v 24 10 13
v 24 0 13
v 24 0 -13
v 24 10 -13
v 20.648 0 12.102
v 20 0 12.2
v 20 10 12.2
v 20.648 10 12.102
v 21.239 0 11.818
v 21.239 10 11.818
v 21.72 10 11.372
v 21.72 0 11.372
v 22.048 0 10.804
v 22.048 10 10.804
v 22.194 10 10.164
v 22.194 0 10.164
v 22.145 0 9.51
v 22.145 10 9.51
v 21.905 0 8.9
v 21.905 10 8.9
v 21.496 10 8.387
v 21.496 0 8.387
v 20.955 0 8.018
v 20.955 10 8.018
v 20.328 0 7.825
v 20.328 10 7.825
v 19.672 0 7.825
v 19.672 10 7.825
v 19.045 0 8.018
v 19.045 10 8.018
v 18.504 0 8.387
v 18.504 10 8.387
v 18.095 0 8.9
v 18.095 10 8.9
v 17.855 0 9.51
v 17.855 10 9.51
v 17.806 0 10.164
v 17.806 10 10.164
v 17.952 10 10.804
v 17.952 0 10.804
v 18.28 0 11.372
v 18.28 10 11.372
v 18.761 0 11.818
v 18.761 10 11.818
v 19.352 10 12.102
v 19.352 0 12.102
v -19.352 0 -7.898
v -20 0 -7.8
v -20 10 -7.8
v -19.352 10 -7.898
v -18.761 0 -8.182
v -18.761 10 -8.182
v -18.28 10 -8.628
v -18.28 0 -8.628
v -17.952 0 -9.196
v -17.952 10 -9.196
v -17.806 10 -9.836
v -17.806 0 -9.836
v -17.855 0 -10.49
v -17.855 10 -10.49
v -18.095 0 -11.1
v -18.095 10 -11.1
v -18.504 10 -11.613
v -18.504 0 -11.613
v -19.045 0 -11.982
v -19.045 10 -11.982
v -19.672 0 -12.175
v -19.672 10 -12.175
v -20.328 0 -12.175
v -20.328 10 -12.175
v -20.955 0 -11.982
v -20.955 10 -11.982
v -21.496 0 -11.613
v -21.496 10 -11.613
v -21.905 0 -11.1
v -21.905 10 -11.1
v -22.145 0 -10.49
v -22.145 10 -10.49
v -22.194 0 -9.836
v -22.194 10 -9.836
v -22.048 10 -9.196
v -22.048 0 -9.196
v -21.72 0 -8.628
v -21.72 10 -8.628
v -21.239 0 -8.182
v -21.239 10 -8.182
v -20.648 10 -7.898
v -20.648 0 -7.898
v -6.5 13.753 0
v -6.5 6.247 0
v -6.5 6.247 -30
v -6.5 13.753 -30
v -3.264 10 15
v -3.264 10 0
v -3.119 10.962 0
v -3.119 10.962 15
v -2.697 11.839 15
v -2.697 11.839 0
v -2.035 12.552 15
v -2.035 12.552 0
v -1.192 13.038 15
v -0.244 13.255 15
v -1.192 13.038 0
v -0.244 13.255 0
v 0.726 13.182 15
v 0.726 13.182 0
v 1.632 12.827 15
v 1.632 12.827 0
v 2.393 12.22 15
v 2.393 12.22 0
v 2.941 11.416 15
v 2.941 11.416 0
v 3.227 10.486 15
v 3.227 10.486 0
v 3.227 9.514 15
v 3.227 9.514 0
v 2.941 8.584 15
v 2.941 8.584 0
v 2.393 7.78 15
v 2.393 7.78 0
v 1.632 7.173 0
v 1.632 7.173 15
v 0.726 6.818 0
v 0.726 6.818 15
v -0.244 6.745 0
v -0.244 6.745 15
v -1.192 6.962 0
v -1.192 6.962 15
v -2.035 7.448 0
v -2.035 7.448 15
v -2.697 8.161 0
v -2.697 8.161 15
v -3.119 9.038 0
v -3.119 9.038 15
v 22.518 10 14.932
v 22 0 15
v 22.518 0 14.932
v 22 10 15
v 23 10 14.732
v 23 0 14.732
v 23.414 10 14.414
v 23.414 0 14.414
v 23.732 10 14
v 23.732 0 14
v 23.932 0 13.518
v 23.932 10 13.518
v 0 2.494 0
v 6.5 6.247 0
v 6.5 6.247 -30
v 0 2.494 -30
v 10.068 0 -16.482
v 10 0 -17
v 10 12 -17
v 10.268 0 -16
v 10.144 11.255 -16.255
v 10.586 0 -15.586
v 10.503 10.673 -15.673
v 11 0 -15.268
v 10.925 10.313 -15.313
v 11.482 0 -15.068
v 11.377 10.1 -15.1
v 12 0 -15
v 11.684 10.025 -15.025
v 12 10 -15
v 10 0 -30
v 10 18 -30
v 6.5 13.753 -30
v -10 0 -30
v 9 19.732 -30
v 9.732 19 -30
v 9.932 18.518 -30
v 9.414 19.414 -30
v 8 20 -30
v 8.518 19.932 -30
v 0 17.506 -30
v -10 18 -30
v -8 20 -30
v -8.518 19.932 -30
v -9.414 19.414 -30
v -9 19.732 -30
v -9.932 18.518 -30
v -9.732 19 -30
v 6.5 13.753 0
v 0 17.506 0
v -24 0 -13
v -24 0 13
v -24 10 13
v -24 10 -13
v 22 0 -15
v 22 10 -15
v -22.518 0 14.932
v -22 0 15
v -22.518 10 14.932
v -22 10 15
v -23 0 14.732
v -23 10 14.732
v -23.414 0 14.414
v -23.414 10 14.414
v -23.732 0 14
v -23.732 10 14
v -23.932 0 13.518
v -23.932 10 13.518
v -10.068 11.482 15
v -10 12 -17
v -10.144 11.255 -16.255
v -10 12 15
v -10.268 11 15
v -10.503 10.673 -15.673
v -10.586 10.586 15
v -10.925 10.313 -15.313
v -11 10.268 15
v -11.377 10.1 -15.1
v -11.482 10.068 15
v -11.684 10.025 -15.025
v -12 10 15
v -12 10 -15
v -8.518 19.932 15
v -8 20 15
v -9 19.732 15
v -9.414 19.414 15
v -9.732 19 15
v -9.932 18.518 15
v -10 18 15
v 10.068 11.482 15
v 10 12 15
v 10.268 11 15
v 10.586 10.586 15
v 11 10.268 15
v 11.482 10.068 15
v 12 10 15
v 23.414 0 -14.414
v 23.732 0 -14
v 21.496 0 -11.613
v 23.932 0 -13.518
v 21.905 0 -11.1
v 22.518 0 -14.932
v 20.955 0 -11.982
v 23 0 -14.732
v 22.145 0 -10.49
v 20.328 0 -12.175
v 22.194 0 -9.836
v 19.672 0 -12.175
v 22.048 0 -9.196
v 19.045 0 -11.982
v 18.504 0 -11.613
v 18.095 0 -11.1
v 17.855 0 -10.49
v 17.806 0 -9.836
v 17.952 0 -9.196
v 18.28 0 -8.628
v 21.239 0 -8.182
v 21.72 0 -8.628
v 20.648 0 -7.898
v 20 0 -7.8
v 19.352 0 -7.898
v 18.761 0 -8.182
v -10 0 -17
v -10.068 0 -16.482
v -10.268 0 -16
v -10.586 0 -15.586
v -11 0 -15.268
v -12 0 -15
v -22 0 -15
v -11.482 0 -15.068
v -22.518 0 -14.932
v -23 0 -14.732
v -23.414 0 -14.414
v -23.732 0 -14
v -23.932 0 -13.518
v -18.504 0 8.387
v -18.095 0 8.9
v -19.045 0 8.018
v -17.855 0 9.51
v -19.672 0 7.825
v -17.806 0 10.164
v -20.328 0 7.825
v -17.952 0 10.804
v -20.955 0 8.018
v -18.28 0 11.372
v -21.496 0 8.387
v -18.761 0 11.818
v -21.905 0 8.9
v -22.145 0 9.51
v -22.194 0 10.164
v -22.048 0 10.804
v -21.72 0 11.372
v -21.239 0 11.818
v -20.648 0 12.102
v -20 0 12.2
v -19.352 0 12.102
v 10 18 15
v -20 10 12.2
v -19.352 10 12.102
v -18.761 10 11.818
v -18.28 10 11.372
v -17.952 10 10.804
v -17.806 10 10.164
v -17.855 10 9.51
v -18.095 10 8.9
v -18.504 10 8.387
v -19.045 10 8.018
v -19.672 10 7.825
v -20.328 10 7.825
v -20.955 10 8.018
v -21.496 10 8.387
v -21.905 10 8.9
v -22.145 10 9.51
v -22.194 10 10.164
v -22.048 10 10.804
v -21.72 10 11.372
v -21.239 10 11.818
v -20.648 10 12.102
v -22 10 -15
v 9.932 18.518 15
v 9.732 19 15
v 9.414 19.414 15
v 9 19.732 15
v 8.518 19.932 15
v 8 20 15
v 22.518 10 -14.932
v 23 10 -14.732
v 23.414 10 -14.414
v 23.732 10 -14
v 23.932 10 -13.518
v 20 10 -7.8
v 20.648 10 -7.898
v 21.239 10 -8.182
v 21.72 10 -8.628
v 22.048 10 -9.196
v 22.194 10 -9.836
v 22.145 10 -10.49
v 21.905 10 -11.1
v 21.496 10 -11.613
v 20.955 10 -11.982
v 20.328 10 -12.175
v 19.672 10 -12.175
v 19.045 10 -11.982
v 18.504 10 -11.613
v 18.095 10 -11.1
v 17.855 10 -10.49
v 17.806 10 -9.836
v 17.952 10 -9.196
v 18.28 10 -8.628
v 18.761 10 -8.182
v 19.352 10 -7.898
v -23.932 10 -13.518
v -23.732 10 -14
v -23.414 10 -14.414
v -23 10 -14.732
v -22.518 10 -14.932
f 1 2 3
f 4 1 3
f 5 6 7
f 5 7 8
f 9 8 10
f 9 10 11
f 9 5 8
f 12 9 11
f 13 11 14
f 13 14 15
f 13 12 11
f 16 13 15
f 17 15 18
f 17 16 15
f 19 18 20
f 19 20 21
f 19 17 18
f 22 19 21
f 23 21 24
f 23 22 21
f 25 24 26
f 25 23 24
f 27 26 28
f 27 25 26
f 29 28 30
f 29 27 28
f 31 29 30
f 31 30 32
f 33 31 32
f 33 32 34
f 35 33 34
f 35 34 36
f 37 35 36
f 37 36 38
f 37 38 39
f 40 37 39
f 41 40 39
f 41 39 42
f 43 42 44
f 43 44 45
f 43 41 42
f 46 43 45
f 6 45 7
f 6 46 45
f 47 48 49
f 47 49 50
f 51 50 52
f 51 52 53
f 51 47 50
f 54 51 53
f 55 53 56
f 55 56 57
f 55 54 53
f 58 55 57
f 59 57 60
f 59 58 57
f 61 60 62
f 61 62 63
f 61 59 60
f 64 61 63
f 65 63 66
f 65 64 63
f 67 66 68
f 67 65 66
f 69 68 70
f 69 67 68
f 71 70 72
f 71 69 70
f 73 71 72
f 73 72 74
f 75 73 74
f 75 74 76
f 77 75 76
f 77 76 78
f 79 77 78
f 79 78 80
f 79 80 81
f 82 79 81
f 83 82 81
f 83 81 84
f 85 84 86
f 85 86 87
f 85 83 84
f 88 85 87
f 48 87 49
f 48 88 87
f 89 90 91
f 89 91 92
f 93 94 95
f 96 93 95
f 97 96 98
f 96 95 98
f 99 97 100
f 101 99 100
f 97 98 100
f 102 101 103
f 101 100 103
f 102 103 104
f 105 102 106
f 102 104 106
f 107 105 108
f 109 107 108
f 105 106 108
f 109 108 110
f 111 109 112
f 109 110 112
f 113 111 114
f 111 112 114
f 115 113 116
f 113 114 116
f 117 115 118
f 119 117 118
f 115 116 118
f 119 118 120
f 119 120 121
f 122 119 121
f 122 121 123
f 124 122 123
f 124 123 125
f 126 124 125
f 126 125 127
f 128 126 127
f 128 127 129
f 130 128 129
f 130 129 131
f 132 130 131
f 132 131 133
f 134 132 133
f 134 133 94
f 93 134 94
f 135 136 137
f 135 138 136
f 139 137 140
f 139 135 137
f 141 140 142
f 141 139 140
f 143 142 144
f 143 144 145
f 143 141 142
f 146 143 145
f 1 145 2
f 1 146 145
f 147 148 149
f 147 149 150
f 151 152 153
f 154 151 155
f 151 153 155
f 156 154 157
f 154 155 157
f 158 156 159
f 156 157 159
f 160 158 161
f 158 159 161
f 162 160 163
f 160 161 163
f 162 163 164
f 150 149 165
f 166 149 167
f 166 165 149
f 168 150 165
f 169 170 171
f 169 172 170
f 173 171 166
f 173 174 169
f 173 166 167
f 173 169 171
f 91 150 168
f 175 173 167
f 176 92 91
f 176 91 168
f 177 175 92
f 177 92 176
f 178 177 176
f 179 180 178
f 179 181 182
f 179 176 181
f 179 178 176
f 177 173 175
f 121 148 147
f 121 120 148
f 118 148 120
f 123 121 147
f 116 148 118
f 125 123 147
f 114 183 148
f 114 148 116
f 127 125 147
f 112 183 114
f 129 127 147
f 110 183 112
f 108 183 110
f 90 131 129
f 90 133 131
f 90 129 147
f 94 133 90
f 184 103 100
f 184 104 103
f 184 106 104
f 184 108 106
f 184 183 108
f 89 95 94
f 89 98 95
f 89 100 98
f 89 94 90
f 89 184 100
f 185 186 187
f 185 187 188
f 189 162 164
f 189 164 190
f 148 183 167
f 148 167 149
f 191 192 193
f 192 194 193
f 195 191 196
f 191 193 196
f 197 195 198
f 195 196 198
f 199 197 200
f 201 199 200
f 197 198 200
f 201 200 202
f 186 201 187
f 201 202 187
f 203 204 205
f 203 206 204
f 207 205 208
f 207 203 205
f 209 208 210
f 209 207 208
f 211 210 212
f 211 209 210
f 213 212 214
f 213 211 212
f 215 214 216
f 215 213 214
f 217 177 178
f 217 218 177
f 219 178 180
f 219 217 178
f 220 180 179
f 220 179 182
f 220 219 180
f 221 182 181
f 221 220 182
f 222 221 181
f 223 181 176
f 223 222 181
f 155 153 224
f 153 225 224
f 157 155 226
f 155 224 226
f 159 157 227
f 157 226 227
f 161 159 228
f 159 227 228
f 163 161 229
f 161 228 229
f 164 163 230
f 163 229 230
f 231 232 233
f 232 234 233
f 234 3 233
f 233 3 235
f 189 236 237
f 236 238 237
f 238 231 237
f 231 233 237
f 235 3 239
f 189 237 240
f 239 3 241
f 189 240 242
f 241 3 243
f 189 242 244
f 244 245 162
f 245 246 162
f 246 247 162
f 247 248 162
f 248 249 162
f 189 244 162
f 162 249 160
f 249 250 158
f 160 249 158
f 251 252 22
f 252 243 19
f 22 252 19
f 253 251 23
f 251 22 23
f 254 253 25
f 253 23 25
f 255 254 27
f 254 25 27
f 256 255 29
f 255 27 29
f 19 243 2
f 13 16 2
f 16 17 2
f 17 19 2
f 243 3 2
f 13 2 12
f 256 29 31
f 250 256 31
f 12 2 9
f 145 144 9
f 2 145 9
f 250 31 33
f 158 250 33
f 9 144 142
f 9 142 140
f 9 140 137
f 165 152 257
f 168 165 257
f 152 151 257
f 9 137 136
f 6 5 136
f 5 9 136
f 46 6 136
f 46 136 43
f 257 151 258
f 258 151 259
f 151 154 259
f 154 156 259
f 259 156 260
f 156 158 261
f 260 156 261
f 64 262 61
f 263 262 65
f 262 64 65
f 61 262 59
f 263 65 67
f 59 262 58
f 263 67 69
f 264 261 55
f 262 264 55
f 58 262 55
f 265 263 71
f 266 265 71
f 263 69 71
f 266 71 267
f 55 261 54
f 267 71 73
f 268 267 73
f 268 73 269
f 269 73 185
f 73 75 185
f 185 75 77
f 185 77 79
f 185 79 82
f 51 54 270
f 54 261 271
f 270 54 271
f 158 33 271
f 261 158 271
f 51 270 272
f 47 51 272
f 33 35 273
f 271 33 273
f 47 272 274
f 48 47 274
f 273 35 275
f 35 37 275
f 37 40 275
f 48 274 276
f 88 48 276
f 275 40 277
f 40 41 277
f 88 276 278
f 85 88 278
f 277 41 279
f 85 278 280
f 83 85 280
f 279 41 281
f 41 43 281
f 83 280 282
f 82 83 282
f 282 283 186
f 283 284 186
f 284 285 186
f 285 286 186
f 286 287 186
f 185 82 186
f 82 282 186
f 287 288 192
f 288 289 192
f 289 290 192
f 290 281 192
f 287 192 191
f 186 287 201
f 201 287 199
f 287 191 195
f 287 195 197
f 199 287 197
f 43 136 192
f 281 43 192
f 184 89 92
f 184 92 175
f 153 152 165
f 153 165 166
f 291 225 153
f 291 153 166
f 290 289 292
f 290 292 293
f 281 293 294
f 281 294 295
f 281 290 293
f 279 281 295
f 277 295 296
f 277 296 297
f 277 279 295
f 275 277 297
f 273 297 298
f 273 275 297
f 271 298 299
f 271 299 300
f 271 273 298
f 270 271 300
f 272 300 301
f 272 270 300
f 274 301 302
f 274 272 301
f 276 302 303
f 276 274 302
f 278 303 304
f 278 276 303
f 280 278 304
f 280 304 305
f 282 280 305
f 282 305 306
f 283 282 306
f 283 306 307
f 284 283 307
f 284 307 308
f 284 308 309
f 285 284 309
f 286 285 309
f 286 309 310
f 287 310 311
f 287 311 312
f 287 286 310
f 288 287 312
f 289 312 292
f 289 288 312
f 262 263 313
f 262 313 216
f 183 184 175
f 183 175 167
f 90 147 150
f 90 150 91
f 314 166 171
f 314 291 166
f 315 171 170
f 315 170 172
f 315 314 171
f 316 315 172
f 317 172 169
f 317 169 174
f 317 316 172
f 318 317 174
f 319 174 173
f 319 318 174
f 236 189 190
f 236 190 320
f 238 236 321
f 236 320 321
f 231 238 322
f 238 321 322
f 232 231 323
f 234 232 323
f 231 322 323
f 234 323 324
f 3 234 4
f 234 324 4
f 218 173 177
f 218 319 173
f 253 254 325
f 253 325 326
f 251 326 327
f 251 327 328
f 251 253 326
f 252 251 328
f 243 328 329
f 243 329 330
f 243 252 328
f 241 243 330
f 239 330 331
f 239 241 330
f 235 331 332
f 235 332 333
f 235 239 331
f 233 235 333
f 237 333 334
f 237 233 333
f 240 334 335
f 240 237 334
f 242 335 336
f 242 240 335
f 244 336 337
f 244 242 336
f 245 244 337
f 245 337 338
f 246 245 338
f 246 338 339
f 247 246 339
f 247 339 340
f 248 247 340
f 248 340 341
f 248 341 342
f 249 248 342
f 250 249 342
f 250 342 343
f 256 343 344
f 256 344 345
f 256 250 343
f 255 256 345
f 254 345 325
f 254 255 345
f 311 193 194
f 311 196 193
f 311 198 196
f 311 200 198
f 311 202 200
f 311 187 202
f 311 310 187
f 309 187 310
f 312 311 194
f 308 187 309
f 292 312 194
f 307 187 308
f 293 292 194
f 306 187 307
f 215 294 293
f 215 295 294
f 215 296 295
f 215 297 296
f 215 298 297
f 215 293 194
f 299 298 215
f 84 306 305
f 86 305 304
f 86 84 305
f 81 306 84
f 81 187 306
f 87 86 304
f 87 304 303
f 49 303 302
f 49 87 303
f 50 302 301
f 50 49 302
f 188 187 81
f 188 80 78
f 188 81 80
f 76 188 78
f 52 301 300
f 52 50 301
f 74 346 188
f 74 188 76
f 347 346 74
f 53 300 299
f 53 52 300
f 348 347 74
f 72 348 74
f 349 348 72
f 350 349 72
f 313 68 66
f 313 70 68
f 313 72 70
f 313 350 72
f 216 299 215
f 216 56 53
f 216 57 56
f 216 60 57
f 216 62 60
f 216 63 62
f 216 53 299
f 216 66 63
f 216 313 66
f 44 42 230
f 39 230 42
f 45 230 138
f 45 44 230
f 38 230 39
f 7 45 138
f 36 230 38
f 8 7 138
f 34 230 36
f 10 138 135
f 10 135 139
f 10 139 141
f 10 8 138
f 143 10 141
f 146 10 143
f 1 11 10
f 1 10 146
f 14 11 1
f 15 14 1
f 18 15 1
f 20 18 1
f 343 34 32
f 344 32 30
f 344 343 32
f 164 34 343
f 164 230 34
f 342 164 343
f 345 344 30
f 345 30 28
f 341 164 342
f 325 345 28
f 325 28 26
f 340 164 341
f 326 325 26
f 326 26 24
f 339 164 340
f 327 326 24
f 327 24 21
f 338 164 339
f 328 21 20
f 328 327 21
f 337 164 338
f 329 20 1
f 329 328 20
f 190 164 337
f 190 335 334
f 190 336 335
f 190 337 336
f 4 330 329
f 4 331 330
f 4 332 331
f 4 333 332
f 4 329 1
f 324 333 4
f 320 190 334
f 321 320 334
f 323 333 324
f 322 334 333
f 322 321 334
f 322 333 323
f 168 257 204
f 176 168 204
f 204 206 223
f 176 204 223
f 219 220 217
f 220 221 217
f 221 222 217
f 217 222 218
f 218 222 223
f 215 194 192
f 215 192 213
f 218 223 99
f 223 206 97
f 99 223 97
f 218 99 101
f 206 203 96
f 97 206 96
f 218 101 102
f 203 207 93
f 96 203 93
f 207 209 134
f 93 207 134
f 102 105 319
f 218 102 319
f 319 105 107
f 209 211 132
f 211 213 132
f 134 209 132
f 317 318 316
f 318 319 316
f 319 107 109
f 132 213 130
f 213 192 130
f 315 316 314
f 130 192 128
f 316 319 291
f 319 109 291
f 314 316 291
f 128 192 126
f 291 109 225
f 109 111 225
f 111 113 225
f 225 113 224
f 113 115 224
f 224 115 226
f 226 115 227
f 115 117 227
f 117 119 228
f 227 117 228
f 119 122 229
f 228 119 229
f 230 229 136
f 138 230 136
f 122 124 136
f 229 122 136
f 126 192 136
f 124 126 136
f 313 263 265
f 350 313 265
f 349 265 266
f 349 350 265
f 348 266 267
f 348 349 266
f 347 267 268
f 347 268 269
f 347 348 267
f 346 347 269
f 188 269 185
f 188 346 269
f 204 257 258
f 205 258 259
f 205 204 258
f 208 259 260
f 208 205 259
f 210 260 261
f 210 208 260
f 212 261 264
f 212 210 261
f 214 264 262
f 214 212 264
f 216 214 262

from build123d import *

# Parameters (mm, degrees)
SKETCH1_W                       = 48
SKETCH1_H                       = 30
SKETCH1_R                       = 2.2
BOSS_EXTRUDE1_DEPTH             = 10
BOSS_EXTRUDE2_REACH             = 41.699
SKETCH3_W                       = 20
SKETCH3_H                       = 20
BOSS_EXTRUDE2_DIRECTION_2_DEPTH = 15
CUT_EXTRUDE1_START              = -30
CUT_EXTRUDE1_DEPTH              = 30
SKETCH5_R                       = 3.2639
CUT_EXTRUDE2_DEPTH              = 44.312815655
FILLET2_R                       = 2


with BuildPart() as part:
    # Sketch1 → Boss-Extrude1 (new body)
    with BuildSketch(Plane(origin=(0, 0, 0), x_dir=(1, 0, 0), z_dir=(0, 1, 0))):
        Rectangle(SKETCH1_W, SKETCH1_H)
        with Locations(Location((-20, 10, 0), (0, 0, 270))):
            Circle(SKETCH1_R, mode=Mode.SUBTRACT)
        with Locations(Location((20, 10, 0), (0, 0, 270))):
            Circle(SKETCH1_R, mode=Mode.SUBTRACT)
        with Locations(Location((20, -10, 0), (0, 0, 270))):
            Circle(SKETCH1_R, mode=Mode.SUBTRACT)
        with Locations(Location((-20, -10, 0), (0, 0, 270))):
            Circle(SKETCH1_R, mode=Mode.SUBTRACT)
    extrude(amount=BOSS_EXTRUDE1_DEPTH)

    # Boss-Extrude2: up to this face of the body (flat: up to its plane)
    boss_extrude2_end = Plane(part.part.faces().sort_by_distance((0, 5, 15))[0])
    # Sketch3 → Boss-Extrude2 (add, up to the picked face)
    with BuildSketch(Plane(origin=(0, 0, -15), x_dir=(-1, 0, 0), z_dir=(0, 0, -1)), mode=Mode.PRIVATE) as boss_extrude2_sk1:
        with Locations((0, 10)):
            Rectangle(SKETCH3_W, SKETCH3_H)
    boss_extrude2_tool1 = split(extrude(boss_extrude2_sk1.sketch, amount=-BOSS_EXTRUDE2_REACH, mode=Mode.PRIVATE), bisect_by=boss_extrude2_end, keep=Keep.BOTH, mode=Mode.PRIVATE)
    add(boss_extrude2_tool1.solids().sort_by(Axis((0, 10, -15), (0, 0, 1)))[0])

    # Sketch3 → Boss-Extrude2 direction 2 (add)
    with BuildSketch(Plane(origin=(0, 0, -15), x_dir=(-1, 0, 0), z_dir=(0, 0, -1))):
        with Locations((0, 10)):
            Rectangle(SKETCH3_W, SKETCH3_H)
    extrude(amount=BOSS_EXTRUDE2_DIRECTION_2_DEPTH)

    # Sketch4 → Cut-Extrude1 (cut)
    with BuildSketch(Plane(origin=(0, 0, -30), x_dir=(-1, 0, 0), z_dir=(0, 0, -1)).offset(CUT_EXTRUDE1_START)):
        Polygon((-6.5, 13.75277675), (-6.5, 6.24722325), (0, 2.494446501), (6.5, 6.24722325), (6.5, 13.75277675), (0, 17.505553499), align=None)
    extrude(amount=CUT_EXTRUDE1_DEPTH, mode=Mode.SUBTRACT)

    # Sketch5 → Cut-Extrude2 (cut, through all)
    with BuildSketch(Plane(origin=(0, 0, -15), x_dir=(-1, 0, 0), z_dir=(0, 0, -1))):
        with Locations((0, 10)):
            Circle(SKETCH5_R)
    extrude(amount=-CUT_EXTRUDE2_DEPTH, mode=Mode.SUBTRACT)

    # Fillet2
    fillet2_edges = [part.edges().sort_by_distance(p)[0] for p in [
        (-10, 5, -15),
        (10, 5, -15),
        (10, 10, 0),
        (10, 20, -7.5),
        (-10, 10, 0),
        (-10, 20, -7.5),
        (-24, 5, -15),
        (24, 5, -15),
        (24, 5, 15),
        (-24, 5, 15),
    ]]
    fillet(fillet2_edges, radius=FILLET2_R)


solid = part.part
